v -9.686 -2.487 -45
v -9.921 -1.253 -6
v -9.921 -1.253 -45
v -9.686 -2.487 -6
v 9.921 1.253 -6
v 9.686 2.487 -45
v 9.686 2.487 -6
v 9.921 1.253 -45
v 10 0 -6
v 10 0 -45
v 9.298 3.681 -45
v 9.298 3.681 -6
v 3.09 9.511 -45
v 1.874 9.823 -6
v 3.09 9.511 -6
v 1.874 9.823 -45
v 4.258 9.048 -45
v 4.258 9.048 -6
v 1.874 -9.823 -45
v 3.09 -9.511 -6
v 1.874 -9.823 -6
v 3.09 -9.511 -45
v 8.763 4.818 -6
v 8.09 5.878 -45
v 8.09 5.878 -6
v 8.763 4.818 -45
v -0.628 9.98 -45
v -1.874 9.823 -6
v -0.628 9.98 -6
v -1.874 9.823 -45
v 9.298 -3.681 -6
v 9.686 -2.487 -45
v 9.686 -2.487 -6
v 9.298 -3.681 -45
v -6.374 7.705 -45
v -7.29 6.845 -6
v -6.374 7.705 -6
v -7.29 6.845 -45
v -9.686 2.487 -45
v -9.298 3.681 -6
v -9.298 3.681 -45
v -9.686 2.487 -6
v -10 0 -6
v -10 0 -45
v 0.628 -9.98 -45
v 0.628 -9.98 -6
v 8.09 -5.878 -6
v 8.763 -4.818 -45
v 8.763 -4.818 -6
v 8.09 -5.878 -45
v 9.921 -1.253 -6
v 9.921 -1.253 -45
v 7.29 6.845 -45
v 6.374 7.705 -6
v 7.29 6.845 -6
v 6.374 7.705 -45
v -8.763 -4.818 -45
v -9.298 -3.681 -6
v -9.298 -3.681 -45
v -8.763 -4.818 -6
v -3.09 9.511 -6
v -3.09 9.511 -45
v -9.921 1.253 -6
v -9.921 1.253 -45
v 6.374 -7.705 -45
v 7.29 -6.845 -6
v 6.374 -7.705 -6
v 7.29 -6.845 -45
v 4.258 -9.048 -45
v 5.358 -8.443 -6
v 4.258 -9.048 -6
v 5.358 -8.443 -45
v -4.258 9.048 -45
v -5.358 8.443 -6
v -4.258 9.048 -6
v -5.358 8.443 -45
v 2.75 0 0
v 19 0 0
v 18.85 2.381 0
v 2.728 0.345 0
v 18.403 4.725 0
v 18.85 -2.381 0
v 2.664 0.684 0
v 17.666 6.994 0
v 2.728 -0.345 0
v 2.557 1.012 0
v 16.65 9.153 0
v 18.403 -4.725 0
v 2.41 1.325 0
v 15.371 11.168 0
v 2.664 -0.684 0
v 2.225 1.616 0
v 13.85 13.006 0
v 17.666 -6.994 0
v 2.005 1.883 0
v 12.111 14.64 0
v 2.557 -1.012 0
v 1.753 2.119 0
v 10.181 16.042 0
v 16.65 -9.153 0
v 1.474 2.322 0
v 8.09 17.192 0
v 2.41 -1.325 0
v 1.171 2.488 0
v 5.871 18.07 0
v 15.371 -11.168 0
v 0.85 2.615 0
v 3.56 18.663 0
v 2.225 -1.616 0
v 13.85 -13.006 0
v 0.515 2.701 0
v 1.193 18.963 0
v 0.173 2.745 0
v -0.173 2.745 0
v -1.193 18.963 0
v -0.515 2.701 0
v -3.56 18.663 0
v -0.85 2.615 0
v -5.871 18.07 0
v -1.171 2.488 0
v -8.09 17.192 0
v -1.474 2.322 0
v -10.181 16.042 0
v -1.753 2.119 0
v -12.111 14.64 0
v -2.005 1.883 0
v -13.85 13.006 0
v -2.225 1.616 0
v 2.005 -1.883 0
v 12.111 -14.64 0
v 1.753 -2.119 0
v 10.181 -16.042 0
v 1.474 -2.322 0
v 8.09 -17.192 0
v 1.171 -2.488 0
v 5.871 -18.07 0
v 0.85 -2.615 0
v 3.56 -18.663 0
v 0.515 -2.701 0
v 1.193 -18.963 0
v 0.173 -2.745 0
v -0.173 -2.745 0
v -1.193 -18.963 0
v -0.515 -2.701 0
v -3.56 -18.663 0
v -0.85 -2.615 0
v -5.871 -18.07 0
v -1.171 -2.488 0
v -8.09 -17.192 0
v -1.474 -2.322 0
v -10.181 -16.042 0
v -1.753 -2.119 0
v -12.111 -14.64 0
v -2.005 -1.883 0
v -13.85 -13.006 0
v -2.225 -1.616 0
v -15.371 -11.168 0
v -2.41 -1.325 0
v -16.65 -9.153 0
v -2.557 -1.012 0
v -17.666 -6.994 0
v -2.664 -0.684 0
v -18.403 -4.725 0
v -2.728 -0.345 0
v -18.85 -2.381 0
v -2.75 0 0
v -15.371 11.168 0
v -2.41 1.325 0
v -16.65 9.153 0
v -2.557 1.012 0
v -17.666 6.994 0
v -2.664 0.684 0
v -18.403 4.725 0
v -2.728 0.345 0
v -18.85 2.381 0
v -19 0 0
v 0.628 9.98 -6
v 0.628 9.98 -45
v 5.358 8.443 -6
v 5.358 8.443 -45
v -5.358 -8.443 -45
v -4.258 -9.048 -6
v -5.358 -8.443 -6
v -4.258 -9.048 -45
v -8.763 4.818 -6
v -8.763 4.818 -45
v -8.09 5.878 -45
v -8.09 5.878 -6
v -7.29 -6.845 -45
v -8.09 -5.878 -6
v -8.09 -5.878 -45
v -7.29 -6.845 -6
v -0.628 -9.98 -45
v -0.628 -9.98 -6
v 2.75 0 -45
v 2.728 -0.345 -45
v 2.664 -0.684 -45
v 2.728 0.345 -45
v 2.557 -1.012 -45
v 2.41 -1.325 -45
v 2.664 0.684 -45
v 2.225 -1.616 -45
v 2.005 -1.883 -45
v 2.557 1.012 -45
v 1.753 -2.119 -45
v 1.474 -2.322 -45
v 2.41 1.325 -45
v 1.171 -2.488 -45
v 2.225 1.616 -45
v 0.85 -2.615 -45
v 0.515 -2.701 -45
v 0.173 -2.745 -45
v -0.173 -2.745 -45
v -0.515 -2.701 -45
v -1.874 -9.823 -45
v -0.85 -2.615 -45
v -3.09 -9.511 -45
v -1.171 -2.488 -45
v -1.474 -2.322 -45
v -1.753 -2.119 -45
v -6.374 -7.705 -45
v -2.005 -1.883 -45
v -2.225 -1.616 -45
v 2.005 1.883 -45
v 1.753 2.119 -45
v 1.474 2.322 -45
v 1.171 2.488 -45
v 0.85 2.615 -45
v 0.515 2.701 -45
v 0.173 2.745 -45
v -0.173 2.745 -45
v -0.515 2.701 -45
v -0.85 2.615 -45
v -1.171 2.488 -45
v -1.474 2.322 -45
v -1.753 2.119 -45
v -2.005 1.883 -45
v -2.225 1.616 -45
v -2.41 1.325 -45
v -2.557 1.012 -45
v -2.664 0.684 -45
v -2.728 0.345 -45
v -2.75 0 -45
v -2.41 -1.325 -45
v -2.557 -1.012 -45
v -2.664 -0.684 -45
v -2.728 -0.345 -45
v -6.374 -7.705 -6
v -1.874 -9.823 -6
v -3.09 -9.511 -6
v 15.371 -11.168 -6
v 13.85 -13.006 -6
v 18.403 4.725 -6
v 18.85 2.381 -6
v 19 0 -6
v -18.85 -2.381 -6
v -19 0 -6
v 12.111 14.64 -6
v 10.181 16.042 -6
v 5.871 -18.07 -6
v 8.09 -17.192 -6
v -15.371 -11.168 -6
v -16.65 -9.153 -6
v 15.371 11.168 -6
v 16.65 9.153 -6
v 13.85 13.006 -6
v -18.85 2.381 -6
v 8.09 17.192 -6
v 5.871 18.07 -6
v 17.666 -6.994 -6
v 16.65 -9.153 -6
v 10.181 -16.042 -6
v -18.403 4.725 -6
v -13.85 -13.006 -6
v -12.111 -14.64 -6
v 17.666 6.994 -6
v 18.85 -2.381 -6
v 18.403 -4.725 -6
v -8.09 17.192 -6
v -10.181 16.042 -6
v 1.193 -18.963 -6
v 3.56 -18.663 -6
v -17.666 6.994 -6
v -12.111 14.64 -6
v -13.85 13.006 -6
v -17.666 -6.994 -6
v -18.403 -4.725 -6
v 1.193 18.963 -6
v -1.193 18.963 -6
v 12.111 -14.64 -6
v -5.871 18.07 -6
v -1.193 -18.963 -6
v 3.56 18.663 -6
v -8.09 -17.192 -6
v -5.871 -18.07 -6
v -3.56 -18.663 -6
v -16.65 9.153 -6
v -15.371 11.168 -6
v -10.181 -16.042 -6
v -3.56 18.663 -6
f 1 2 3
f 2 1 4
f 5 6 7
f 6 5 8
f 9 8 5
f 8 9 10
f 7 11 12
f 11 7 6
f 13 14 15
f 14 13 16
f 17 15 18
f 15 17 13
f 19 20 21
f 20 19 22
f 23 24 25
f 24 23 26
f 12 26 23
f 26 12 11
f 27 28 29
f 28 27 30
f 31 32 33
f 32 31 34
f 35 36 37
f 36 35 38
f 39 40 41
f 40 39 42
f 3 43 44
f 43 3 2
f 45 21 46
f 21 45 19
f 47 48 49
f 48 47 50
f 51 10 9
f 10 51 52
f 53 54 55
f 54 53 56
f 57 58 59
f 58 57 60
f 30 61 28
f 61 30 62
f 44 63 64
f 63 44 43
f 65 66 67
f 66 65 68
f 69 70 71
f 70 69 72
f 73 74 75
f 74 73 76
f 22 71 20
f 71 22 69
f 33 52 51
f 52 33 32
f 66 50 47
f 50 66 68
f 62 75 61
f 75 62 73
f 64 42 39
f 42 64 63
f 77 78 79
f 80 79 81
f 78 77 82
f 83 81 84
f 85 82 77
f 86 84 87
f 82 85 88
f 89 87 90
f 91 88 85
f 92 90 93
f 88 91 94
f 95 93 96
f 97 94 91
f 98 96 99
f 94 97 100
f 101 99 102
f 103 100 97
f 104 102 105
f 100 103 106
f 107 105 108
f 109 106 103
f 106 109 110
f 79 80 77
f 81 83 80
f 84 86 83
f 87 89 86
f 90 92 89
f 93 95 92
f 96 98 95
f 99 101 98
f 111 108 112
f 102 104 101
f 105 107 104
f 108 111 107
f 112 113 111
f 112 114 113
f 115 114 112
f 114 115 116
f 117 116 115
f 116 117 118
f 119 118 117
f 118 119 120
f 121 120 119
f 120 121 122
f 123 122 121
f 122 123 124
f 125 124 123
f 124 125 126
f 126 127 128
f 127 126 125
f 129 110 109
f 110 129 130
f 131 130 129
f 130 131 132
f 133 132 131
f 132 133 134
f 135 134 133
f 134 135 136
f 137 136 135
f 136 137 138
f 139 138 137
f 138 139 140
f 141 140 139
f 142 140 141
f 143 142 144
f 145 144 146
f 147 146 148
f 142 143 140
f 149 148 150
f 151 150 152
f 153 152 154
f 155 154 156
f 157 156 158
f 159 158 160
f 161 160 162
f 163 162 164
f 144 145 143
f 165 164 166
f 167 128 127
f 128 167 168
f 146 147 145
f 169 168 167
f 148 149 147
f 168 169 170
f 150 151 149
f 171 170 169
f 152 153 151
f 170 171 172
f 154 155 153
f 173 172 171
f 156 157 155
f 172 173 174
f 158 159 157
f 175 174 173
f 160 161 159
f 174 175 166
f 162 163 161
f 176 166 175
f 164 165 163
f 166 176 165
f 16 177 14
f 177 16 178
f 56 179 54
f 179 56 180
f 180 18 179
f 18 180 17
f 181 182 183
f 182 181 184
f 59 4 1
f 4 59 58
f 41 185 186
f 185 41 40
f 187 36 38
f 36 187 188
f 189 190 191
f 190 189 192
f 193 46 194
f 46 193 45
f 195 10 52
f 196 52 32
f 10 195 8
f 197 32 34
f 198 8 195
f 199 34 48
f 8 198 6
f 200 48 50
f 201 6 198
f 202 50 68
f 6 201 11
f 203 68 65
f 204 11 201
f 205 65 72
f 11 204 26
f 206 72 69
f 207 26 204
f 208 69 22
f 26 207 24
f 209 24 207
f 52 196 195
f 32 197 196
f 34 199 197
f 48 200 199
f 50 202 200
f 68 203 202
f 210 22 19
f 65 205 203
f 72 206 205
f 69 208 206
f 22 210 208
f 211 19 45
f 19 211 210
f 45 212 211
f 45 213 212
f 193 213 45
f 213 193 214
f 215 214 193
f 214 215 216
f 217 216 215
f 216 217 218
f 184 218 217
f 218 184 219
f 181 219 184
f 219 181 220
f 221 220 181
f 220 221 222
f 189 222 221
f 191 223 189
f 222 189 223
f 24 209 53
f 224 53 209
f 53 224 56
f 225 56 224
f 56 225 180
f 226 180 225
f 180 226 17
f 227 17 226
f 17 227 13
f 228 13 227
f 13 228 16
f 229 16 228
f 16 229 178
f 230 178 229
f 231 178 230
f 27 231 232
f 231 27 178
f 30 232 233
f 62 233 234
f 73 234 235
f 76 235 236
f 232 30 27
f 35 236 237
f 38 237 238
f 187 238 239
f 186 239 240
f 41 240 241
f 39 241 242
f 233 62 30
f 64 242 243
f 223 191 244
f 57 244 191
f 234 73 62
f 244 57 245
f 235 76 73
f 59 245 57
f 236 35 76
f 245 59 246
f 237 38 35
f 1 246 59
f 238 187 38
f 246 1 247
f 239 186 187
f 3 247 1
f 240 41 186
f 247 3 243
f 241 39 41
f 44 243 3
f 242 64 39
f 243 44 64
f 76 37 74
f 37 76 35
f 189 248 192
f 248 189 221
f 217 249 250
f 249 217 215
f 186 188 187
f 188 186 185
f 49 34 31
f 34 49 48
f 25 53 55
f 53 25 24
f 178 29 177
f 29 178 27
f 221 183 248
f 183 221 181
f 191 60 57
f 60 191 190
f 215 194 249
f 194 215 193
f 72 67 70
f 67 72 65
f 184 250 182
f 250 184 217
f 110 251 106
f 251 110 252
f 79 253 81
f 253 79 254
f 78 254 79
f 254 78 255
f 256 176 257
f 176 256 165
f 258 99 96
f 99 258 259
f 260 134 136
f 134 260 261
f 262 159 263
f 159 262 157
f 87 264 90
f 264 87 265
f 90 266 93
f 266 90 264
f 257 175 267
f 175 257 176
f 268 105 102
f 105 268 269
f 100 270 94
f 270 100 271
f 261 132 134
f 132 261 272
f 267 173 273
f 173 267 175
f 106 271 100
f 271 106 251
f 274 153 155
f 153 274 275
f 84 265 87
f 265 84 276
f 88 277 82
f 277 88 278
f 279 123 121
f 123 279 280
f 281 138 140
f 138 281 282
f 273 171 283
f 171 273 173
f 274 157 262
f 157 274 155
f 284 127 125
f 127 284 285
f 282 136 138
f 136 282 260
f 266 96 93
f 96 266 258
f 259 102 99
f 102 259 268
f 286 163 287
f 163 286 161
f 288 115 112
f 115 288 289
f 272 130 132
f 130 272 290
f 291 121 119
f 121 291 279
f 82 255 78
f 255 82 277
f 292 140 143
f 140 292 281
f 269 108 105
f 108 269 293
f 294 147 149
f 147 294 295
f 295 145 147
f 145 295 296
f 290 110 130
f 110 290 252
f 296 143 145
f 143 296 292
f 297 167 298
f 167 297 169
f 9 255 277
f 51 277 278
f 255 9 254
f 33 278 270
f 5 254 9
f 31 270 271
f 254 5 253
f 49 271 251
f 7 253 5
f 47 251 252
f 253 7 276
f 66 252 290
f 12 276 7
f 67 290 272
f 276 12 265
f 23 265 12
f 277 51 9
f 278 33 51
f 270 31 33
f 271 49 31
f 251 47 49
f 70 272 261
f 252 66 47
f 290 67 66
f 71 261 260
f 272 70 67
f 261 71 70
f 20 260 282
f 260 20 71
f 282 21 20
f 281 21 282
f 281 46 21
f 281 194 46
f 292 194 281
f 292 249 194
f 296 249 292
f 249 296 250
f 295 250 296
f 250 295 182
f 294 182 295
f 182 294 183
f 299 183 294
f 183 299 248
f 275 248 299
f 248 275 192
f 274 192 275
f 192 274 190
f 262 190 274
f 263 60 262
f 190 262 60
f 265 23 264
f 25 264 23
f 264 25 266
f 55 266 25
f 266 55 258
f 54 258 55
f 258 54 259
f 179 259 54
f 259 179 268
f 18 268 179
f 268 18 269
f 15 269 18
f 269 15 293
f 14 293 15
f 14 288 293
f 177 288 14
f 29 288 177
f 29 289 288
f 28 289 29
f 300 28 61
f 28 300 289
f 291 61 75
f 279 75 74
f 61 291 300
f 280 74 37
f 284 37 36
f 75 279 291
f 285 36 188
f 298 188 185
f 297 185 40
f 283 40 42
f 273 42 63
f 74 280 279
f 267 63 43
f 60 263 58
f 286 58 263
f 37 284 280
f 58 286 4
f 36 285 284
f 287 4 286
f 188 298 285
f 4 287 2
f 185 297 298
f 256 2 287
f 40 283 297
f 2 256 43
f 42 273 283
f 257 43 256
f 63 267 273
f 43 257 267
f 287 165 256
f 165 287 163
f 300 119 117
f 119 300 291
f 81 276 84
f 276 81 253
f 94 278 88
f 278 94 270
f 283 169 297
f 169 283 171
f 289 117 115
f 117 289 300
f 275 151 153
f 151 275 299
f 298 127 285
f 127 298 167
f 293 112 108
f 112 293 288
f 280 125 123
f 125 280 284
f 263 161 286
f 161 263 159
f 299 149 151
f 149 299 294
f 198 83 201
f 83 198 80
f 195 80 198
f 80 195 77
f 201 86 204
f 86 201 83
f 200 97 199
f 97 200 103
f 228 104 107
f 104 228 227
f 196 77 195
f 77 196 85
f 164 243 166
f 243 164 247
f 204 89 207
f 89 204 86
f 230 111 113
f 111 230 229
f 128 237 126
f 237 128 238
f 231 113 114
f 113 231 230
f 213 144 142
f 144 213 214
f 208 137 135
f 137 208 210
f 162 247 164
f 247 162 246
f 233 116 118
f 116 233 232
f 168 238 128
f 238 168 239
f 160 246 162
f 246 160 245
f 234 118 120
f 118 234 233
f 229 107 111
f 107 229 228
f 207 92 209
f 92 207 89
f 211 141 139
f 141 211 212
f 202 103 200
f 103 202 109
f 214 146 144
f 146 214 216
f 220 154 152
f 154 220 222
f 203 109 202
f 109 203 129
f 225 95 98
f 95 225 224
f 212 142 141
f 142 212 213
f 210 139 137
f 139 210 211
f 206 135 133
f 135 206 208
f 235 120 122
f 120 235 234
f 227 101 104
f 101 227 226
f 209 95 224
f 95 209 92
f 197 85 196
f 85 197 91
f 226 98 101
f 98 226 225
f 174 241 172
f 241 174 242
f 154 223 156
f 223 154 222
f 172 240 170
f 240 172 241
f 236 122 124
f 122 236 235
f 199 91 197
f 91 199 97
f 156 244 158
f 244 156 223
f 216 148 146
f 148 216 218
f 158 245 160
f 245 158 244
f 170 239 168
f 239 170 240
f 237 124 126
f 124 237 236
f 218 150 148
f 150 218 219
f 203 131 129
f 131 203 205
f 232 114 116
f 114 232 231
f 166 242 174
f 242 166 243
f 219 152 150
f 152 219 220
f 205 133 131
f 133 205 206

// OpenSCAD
$fn = 50;


difference() {
	union() {
		translate(v = [0, 0, -45.0000000000]) {
			cylinder(h = 45, r = 10.0000000000);
		}
		translate(v = [0, 0, -6.0000000000]) {
			cylinder(h = 6, r = 19.0000000000);
		}
	}
	union() {
		#translate(v = [0, 0, -45]) {
			cylinder(h = 45, r = 2.7500000000);
		}
	}
}
